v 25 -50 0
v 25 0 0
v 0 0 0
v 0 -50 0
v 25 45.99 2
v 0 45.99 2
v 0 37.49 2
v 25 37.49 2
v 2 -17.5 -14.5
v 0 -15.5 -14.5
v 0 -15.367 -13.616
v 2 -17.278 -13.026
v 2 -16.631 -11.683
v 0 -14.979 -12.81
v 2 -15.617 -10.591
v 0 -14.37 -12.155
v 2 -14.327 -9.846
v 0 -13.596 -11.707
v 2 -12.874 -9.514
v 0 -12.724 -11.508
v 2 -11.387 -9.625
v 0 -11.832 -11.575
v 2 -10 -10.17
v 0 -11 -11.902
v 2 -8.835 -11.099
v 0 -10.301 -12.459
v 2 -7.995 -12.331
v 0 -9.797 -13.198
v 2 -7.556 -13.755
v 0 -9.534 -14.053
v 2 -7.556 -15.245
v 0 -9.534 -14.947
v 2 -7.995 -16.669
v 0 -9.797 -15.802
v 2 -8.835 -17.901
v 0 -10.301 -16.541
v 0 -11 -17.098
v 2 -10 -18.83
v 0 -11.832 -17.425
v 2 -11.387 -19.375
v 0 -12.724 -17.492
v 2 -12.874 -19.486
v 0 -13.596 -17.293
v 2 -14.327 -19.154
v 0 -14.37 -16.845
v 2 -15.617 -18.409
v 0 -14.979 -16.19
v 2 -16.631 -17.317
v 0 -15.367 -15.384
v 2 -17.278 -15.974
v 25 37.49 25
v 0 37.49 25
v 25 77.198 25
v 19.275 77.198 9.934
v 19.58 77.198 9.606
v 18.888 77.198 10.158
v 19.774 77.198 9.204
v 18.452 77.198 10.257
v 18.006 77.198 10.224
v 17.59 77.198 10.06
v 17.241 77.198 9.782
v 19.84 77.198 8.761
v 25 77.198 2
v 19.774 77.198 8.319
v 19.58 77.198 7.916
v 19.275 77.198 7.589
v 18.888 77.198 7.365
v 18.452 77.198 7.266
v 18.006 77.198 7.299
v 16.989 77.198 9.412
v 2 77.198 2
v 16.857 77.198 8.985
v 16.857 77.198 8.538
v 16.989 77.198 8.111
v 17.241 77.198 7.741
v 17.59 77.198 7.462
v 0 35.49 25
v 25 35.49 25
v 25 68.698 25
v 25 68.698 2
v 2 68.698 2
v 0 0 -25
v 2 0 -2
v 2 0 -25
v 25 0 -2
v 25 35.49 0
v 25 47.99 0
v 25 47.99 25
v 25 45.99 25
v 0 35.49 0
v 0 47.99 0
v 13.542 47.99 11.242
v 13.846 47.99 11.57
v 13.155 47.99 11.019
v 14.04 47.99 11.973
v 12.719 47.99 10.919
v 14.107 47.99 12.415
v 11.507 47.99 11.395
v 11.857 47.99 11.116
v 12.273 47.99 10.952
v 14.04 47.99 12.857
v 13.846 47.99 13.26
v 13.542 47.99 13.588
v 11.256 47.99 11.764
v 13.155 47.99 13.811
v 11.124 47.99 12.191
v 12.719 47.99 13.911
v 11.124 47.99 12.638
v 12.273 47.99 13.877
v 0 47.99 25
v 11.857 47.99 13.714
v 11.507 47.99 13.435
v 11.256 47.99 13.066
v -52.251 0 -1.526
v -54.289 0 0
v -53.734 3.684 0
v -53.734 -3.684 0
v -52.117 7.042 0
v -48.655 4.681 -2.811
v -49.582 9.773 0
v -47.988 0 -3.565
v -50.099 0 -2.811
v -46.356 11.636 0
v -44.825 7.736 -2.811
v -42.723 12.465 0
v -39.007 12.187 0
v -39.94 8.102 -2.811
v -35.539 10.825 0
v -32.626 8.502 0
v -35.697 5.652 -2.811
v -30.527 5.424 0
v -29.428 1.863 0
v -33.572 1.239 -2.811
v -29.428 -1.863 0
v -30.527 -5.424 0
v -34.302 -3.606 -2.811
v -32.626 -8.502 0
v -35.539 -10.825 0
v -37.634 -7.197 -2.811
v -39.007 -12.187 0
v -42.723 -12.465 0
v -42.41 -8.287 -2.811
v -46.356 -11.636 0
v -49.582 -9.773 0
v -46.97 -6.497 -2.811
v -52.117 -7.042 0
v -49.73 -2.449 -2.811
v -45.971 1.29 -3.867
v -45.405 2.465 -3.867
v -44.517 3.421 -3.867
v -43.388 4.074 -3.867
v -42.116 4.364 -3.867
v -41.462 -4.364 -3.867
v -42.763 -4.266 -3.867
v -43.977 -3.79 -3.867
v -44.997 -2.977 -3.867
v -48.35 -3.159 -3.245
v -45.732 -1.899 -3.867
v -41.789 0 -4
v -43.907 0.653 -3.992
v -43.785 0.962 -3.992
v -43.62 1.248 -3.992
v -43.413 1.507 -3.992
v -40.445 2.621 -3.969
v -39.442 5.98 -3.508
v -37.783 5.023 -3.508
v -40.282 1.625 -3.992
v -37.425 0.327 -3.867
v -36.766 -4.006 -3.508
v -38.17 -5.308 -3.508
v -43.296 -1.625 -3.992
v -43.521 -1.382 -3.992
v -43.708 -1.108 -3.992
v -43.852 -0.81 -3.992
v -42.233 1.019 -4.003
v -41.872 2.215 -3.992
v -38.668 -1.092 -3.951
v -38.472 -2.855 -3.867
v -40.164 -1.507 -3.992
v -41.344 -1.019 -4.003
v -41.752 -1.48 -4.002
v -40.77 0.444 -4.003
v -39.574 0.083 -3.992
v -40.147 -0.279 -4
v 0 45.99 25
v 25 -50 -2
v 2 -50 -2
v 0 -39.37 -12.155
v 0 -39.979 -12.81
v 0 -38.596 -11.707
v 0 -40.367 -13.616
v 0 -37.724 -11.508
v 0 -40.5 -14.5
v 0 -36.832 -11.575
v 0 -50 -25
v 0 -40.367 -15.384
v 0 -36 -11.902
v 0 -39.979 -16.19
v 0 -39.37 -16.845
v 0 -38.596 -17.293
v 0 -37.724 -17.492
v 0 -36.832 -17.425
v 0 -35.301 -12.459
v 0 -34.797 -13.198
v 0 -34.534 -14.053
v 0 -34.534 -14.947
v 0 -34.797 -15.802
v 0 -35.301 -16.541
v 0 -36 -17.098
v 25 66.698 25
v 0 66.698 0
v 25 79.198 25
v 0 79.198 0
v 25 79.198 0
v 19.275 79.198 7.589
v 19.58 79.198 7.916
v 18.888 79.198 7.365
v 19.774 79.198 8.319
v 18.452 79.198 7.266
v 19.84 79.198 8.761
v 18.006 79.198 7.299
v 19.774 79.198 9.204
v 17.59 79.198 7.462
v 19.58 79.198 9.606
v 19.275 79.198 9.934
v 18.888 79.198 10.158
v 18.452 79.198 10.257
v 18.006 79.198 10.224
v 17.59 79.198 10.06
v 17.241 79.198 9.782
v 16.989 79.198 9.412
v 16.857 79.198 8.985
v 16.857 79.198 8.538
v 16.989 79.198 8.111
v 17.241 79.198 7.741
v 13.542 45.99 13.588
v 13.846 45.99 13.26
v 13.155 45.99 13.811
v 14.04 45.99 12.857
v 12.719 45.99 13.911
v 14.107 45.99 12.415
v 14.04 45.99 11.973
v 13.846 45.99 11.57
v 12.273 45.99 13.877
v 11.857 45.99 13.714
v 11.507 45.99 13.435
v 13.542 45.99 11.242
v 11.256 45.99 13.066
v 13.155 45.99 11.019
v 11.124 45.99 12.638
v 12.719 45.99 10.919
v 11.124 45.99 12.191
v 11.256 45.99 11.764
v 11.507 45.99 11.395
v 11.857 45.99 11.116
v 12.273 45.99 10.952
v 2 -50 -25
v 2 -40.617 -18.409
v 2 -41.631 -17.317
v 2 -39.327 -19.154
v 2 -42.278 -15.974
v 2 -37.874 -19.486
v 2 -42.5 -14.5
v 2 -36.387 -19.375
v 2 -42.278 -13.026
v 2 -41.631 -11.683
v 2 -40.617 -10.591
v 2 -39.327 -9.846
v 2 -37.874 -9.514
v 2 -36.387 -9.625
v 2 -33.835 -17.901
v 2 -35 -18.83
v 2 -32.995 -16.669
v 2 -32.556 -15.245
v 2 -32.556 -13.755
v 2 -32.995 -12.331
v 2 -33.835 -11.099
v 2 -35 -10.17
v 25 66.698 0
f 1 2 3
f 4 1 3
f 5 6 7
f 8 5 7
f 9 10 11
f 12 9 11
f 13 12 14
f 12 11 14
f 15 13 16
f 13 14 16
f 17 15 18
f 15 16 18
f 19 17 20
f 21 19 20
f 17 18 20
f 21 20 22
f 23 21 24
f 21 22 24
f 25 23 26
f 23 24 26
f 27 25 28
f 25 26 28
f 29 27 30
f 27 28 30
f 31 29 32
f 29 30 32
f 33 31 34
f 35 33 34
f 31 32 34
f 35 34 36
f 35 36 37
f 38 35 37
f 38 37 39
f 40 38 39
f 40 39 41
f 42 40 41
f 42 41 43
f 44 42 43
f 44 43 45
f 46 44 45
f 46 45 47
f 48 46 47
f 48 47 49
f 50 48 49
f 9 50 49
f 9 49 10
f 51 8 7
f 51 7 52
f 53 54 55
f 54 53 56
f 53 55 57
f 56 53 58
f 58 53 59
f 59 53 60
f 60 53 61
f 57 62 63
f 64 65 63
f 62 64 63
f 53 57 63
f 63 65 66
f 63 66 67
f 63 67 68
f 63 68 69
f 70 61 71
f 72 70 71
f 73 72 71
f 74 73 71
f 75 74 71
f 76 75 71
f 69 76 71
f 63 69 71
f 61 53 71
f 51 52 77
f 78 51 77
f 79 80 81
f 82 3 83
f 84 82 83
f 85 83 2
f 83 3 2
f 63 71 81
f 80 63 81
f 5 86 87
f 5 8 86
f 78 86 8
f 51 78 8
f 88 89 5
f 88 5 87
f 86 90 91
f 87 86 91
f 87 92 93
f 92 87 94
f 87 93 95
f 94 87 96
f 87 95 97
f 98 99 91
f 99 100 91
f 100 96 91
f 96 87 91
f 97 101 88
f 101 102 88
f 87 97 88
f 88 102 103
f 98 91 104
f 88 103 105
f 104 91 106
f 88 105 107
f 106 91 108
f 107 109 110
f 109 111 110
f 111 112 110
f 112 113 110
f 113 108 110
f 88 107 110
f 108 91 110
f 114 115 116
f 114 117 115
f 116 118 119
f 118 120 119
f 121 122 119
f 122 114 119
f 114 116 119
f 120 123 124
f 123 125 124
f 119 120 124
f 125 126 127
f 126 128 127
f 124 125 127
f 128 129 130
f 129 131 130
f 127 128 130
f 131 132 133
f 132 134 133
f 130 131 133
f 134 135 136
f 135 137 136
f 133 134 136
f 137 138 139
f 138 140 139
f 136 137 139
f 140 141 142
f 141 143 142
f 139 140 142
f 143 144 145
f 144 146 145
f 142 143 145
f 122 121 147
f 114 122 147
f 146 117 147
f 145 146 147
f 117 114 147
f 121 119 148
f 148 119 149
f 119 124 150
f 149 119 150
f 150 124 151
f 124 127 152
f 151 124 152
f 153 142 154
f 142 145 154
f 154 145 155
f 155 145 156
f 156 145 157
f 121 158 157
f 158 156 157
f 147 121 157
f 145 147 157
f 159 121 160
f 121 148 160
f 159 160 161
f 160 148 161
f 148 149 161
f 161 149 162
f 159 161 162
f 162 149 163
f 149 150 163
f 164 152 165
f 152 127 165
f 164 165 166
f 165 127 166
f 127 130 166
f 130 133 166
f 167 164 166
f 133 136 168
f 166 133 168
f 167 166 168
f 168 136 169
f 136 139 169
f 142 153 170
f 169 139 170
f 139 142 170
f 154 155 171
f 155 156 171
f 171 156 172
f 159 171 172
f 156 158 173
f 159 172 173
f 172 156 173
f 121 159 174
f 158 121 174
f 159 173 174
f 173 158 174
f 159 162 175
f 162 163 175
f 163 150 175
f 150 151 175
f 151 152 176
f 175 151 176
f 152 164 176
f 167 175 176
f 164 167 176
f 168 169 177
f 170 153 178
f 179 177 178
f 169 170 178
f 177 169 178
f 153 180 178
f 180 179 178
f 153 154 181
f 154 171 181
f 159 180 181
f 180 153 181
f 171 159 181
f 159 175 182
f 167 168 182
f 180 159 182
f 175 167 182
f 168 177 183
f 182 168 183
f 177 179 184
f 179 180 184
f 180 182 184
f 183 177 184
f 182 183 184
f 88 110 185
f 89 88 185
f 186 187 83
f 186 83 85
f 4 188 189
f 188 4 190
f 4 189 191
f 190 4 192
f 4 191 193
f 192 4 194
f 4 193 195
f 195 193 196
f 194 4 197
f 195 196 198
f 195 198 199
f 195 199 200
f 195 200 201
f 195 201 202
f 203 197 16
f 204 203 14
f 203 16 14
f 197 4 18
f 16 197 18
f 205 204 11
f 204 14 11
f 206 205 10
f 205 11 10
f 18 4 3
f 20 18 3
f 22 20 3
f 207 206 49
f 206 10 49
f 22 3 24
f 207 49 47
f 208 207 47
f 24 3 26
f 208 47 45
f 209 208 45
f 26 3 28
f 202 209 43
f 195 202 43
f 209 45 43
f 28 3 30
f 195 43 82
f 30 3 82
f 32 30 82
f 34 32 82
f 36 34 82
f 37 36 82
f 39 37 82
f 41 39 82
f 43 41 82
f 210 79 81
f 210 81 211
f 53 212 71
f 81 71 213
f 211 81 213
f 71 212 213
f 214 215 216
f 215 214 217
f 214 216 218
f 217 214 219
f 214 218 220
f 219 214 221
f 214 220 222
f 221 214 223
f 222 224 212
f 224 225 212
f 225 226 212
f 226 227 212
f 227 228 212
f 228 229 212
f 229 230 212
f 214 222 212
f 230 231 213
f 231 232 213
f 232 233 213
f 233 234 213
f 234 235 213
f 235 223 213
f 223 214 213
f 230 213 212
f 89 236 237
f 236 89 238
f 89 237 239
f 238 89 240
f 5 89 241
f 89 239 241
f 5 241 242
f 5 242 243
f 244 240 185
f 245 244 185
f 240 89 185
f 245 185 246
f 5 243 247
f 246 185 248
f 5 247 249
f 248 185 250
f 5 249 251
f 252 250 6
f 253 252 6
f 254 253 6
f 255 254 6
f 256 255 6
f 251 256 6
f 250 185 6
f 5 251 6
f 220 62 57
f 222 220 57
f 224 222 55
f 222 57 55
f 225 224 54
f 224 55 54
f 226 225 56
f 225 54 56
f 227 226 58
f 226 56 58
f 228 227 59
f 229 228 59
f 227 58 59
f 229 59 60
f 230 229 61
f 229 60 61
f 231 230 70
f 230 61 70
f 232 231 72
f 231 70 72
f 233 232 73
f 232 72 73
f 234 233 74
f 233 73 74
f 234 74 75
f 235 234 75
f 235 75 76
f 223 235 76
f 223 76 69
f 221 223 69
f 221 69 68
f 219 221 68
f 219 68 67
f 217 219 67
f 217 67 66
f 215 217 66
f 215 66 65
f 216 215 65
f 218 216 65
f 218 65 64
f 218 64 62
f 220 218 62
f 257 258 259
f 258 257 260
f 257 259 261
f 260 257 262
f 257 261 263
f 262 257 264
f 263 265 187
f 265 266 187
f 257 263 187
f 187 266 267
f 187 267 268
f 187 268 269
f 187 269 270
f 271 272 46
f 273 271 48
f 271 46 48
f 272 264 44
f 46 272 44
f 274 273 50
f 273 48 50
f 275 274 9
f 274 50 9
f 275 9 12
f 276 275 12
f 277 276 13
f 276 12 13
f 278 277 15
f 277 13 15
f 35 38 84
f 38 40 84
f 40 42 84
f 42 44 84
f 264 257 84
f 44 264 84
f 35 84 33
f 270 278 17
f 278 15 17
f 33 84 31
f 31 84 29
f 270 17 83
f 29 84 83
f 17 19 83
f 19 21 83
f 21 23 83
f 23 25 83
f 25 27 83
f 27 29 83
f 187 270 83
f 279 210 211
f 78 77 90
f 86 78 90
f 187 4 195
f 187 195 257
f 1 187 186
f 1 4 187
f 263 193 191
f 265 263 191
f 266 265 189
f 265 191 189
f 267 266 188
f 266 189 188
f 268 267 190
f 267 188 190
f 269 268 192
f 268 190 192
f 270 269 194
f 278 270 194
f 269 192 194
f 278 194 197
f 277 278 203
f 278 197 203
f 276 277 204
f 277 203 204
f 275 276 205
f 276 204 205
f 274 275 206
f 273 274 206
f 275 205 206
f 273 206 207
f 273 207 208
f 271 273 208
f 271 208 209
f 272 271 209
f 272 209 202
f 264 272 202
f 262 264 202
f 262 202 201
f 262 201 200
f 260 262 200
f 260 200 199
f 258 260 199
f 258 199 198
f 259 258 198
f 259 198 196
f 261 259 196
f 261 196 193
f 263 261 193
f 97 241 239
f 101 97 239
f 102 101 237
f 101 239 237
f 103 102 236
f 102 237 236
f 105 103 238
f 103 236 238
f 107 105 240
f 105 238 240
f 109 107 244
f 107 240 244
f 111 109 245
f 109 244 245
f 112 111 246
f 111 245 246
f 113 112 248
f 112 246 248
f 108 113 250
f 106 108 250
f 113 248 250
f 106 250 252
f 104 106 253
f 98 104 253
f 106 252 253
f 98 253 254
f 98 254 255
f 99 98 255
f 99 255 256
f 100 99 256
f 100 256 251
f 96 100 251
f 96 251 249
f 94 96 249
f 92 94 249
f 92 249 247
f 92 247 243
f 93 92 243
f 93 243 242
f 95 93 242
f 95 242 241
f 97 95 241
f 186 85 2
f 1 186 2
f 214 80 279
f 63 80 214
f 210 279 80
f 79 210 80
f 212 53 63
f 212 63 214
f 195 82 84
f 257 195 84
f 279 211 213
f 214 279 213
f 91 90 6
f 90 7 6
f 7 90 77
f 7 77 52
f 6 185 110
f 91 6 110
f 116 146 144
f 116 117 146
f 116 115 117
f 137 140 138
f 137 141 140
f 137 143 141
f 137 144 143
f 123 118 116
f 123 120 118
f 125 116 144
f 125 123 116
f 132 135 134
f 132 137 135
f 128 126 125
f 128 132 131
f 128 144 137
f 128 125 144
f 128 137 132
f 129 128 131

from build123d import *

# Parameters (mm, degrees)
F1_DEPTH       = 50
F3_D           = 5
F3_CSINK_D     = 10
F3_CSINK_ANGLE = 90
F7_DEPTH       = 25
F9_DEPTH       = 25
F11_DEPTH      = 25
F14_D          = 3
F14_DEPTH      = 5
F14_TIP        = 0.9012909285
F15_D          = 3
F15_DEPTH      = 5
F15_TIP        = 0.9012909285


with BuildPart() as f1:
    # F0 (on Front) → F1 (new body)
    with BuildSketch(Plane.XZ):
        Polygon((25, -2), (25, 0), (0, 0), (0, -25), (2, -25), (2, -2), align=None)
    extrude(amount=F1_DEPTH)

    # F3 (through all)
    with Locations(Plane.YZ.offset(2)):
        with Locations((-37.5, -14.5), (-12.5, -14.5)):
            CounterSinkHole(F3_D / 2, F3_CSINK_D / 2, counter_sink_angle=F3_CSINK_ANGLE)


with BuildPart() as f5:
    # F4 (on Front) → F5 (revolve)
    with BuildSketch(Plane.XZ):
        with BuildLine():
            Line((-41.7888606299, 0), (-54.2888606299, 0))
            add(Edge.make_bspline(
                [(-41.7888606299, -4), (-44.266934, -4.0125659739), (-49.084667253, -4.0369960456), (-52.5876766603, -1.3196421541), (-54.2888606299, 0)],
                knots=[0, 0, 0, 0, 0.5143650011, 1, 1, 1, 1], degree=3))
            Line((-41.7888606299, -4), (-41.7888606299, 0))
        make_face()
    revolve(axis=Axis((-41.7888606299, 0, -2), (0, 0, -1)))


with BuildPart() as f7:
    # F6 (on Right) → F7 (new body)
    with BuildSketch(Plane.YZ):
        Polygon((68.6983019114, 25), (66.6983001937, 25), (66.6983001937, 0), (79.1983001937, 0), (79.1983001937, 25), (77.1982984761, 25), (77.1982984761, 2.0000017176), (68.6983019114, 2.0000017176), align=None)
    extrude(amount=F7_DEPTH)

    # F8 (on face) → F9 (cut)
    with BuildSketch(Plane(origin=(0, 79.1983001937, 0), x_dir=(-1, 0, 0), z_dir=(0, 1, 0))):
        Polygon((-22.9984801263, 25), (-25, 25), (0, 0), (0, 25), align=None)
    extrude(amount=-F9_DEPTH, mode=Mode.SUBTRACT)

    # F14
    with Locations(Plane(origin=(0, 79.1983001937, 0), x_dir=(-1, 0, 0), z_dir=(0, 1, 0))):
        with Locations((-18.3401871473, 8.7614459917)):
            Hole(F14_D / 2, depth=F14_DEPTH)
            with Locations((0, 0, -(F14_DEPTH + F14_TIP / 2))):  # 118° drill point
                Cone(0, F14_D / 2, F14_TIP, mode=Mode.SUBTRACT)


with BuildPart() as f11:
    # F10 (on Right) → F11 (new body)
    with BuildSketch(Plane.YZ):
        Polygon((37.4900956154, 25), (35.4900956154, 25), (35.4900956154, 0), (47.9900956154, 0), (47.9900956154, 25), (45.9900956154, 25), (45.9900956154, 2), (37.4900956154, 2), align=None)
    extrude(amount=F11_DEPTH)

    # F15
    with Locations(Plane(origin=(0, 47.9900956154, 0), x_dir=(-1, 0, 0), z_dir=(0, 1, 0))):
        with Locations((-12.6069718972, 12.4148484319)):
            Hole(F15_D / 2, depth=F15_DEPTH)
            with Locations((0, 0, -(F15_DEPTH + F15_TIP / 2))):  # 118° drill point
                Cone(0, F15_D / 2, F15_TIP, mode=Mode.SUBTRACT)


solid = Compound([f1.part, f5.part, f7.part, f11.part])
